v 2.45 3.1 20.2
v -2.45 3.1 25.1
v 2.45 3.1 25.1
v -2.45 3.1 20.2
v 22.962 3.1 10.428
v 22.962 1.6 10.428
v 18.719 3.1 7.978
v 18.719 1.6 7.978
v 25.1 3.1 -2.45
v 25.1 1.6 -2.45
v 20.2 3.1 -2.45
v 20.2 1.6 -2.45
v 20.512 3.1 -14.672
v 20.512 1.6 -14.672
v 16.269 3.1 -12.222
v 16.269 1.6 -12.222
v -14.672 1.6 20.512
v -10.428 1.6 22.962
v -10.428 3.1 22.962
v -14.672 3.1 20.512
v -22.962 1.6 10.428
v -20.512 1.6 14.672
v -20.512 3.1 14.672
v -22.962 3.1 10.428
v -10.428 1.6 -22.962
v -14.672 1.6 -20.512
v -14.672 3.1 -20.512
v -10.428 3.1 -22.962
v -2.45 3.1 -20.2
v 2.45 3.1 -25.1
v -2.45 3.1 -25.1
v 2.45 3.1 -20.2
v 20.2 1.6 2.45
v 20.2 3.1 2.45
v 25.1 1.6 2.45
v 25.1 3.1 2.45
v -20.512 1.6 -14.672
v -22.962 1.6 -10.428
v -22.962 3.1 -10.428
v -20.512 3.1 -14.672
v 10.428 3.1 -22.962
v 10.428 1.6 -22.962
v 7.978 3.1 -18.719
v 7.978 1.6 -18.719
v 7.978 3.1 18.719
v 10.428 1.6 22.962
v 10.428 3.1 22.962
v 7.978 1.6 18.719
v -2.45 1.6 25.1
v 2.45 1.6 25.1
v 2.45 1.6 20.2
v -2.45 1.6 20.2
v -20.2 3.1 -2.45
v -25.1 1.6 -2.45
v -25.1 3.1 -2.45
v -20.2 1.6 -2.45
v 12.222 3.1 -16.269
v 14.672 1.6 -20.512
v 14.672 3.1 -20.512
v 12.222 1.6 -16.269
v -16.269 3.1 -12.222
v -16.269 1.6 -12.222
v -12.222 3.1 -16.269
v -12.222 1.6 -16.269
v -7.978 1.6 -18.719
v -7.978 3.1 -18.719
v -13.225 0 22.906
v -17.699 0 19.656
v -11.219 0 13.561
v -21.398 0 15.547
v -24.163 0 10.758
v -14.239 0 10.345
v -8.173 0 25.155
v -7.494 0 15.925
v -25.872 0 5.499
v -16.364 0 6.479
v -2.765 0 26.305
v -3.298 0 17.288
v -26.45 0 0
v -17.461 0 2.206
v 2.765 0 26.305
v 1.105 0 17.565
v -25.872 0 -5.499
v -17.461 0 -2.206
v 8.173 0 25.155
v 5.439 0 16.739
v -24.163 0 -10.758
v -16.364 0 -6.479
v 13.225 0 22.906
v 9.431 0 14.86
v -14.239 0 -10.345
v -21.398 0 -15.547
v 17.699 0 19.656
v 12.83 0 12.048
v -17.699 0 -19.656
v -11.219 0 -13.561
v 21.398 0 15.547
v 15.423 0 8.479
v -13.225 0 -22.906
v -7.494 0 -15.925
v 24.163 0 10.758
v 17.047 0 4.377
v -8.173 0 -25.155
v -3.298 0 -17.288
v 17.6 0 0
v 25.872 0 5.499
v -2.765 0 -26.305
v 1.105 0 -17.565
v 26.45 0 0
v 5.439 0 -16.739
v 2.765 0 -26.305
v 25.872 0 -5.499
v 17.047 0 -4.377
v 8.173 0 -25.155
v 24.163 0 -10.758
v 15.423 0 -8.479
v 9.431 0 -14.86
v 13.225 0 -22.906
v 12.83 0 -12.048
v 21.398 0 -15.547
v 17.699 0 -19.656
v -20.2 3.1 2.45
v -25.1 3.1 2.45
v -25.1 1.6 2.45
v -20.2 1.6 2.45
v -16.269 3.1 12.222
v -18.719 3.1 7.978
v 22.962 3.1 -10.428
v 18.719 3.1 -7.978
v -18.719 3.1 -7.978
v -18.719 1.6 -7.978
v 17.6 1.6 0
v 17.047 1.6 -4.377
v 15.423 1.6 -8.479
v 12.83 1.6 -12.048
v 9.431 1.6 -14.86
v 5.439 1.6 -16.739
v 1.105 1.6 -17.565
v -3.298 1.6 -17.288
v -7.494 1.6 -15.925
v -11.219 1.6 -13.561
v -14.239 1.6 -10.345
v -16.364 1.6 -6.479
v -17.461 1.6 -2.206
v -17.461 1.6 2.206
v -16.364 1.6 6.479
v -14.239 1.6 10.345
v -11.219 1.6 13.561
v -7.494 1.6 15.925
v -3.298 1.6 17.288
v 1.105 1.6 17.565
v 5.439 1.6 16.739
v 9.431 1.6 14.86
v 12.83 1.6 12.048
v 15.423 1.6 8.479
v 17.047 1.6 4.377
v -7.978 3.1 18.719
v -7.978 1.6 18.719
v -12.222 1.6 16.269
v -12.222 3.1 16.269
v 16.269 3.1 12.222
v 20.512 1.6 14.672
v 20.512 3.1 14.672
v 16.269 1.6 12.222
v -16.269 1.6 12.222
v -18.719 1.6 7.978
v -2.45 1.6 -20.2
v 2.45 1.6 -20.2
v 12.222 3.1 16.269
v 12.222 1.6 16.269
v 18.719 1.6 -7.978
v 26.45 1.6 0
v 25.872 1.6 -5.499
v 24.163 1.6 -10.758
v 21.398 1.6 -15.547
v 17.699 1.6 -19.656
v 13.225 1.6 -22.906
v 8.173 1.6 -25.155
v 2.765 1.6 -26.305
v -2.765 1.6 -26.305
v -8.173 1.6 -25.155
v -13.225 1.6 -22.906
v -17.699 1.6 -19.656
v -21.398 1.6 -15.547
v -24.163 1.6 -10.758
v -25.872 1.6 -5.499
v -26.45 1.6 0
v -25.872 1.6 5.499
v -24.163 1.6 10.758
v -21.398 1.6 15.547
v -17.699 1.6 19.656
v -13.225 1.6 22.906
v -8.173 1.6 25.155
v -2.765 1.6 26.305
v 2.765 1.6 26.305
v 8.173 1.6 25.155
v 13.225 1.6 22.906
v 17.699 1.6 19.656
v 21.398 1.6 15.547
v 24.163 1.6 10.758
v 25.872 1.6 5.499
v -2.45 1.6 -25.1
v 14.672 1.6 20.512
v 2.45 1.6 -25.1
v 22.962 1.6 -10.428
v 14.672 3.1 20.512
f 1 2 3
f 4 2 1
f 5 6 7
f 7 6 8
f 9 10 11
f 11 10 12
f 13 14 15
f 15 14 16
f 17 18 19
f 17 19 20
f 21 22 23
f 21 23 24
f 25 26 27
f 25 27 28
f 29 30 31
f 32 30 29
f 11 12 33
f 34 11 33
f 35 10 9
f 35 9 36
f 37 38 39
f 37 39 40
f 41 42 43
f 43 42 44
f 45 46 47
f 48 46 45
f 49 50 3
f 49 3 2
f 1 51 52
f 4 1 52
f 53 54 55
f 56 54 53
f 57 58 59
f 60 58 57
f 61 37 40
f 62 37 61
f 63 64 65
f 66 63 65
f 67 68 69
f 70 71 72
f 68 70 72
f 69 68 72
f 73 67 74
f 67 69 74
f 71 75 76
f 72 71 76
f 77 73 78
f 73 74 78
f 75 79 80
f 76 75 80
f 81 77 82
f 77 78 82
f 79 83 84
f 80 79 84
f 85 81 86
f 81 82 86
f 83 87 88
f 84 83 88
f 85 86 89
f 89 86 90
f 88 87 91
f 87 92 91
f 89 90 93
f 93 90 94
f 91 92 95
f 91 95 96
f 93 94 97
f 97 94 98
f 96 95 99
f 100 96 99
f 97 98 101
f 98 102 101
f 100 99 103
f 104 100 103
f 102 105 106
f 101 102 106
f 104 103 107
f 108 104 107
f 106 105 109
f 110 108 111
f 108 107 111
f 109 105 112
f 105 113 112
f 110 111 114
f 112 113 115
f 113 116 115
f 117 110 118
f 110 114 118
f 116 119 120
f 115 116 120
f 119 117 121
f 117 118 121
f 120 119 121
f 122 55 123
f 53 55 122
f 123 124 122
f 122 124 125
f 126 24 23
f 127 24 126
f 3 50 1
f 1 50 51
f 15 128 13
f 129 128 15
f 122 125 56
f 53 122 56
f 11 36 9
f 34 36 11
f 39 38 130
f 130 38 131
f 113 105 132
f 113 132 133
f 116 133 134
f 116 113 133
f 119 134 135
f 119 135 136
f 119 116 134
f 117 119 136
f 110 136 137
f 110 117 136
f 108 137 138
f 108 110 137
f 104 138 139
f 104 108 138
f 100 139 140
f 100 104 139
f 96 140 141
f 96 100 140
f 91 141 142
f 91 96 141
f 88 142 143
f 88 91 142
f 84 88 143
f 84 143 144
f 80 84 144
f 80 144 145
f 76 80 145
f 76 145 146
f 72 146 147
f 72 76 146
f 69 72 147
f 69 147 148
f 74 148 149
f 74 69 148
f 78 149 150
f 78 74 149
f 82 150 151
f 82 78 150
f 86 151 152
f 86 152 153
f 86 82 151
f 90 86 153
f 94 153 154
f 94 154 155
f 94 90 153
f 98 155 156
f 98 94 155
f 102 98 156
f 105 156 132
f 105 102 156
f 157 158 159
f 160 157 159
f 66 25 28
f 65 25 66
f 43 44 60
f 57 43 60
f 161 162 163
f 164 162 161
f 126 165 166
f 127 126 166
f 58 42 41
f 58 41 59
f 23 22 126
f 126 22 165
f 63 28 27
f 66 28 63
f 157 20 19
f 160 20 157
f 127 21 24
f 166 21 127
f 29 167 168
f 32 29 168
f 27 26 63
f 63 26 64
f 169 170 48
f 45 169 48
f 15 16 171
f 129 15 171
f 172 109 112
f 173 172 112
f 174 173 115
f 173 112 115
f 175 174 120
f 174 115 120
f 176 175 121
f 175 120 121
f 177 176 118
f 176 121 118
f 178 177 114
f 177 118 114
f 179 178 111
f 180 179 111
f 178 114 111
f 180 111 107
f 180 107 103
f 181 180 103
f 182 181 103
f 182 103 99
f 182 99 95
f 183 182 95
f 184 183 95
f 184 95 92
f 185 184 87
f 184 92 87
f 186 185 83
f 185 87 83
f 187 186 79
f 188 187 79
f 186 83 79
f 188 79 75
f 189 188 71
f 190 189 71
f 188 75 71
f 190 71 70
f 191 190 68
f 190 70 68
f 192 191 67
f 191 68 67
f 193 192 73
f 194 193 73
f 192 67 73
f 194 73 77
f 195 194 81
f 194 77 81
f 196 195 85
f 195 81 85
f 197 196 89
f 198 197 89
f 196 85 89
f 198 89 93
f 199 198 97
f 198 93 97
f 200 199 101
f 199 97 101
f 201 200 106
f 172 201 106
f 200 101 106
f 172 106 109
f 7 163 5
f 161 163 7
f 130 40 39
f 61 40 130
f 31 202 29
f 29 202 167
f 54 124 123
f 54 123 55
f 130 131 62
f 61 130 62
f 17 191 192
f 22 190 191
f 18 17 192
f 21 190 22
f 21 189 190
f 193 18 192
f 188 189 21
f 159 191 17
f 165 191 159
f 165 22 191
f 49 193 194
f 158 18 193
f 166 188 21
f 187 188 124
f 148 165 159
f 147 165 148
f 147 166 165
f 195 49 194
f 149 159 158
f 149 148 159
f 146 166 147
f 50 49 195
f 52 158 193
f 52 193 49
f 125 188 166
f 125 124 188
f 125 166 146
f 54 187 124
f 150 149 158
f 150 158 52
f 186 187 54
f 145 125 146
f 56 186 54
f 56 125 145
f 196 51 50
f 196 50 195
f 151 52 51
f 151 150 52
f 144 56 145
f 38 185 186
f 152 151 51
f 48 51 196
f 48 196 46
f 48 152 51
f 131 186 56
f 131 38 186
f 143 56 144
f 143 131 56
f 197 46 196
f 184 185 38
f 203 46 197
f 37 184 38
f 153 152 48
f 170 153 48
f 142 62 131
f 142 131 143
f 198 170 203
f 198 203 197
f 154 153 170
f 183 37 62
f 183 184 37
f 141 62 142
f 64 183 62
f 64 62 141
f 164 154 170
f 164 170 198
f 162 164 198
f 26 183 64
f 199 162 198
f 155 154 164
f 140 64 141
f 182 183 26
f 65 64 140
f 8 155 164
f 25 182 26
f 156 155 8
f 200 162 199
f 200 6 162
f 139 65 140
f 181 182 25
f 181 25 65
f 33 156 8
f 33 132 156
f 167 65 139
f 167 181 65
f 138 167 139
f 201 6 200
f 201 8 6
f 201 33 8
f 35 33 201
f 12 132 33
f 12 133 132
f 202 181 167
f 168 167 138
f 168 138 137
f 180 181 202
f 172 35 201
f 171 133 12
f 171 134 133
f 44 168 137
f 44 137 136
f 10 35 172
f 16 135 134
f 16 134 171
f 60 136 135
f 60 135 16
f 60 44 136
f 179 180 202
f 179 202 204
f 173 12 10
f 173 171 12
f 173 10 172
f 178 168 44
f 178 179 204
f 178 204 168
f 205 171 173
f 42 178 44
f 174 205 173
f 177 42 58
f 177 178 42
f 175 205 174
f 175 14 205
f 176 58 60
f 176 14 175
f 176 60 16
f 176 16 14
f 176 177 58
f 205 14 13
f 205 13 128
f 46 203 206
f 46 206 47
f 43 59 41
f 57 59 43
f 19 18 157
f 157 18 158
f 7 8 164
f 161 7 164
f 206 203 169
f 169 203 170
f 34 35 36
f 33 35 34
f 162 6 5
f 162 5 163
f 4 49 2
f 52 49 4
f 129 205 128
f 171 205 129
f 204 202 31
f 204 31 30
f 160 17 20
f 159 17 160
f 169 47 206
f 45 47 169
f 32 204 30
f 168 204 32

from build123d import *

# Parameters (mm, degrees)
SKETCH_1_R               = 26.45
SKETCH_1_R_2             = 17.6
EXTRUDE_1_DEPTH          = 1.6
SKETCH_2_W               = 4.9
SKETCH_2_H               = 4.9
EXTRUDE_2_DEPTH          = 1.5
PATTERN_CIRCULAR_1_COUNT = 12


with BuildPart() as part:
    # 草图1 → 凸台-拉伸1 (new body)
    with BuildSketch(Plane(origin=(0, 0, 0), x_dir=(1, 0, 0), z_dir=(0, 1, 0))):
        Circle(SKETCH_1_R)
        Circle(SKETCH_1_R_2, mode=Mode.SUBTRACT)
    extrude(amount=EXTRUDE_1_DEPTH)

    # 草图2 → 凸台-拉伸2 (add)
    with BuildSketch(Plane(origin=(0, 1.6, 0), x_dir=(1, 0, 0), z_dir=(0, 1, 0))):
        with Locations((-22.65, 0)):
            Rectangle(SKETCH_2_W, SKETCH_2_H)
    extrude_2 = extrude(amount=EXTRUDE_2_DEPTH)

    # 阵列(圆周)1: 凸台-拉伸2 ×12 about axis
    pattern_circular_1_axis = Axis((0, 0, 0), (0, 1, 0))
    for i in range(1, PATTERN_CIRCULAR_1_COUNT):
        add(extrude_2.rotate(pattern_circular_1_axis, i * 360 / PATTERN_CIRCULAR_1_COUNT))


solid = part.part
